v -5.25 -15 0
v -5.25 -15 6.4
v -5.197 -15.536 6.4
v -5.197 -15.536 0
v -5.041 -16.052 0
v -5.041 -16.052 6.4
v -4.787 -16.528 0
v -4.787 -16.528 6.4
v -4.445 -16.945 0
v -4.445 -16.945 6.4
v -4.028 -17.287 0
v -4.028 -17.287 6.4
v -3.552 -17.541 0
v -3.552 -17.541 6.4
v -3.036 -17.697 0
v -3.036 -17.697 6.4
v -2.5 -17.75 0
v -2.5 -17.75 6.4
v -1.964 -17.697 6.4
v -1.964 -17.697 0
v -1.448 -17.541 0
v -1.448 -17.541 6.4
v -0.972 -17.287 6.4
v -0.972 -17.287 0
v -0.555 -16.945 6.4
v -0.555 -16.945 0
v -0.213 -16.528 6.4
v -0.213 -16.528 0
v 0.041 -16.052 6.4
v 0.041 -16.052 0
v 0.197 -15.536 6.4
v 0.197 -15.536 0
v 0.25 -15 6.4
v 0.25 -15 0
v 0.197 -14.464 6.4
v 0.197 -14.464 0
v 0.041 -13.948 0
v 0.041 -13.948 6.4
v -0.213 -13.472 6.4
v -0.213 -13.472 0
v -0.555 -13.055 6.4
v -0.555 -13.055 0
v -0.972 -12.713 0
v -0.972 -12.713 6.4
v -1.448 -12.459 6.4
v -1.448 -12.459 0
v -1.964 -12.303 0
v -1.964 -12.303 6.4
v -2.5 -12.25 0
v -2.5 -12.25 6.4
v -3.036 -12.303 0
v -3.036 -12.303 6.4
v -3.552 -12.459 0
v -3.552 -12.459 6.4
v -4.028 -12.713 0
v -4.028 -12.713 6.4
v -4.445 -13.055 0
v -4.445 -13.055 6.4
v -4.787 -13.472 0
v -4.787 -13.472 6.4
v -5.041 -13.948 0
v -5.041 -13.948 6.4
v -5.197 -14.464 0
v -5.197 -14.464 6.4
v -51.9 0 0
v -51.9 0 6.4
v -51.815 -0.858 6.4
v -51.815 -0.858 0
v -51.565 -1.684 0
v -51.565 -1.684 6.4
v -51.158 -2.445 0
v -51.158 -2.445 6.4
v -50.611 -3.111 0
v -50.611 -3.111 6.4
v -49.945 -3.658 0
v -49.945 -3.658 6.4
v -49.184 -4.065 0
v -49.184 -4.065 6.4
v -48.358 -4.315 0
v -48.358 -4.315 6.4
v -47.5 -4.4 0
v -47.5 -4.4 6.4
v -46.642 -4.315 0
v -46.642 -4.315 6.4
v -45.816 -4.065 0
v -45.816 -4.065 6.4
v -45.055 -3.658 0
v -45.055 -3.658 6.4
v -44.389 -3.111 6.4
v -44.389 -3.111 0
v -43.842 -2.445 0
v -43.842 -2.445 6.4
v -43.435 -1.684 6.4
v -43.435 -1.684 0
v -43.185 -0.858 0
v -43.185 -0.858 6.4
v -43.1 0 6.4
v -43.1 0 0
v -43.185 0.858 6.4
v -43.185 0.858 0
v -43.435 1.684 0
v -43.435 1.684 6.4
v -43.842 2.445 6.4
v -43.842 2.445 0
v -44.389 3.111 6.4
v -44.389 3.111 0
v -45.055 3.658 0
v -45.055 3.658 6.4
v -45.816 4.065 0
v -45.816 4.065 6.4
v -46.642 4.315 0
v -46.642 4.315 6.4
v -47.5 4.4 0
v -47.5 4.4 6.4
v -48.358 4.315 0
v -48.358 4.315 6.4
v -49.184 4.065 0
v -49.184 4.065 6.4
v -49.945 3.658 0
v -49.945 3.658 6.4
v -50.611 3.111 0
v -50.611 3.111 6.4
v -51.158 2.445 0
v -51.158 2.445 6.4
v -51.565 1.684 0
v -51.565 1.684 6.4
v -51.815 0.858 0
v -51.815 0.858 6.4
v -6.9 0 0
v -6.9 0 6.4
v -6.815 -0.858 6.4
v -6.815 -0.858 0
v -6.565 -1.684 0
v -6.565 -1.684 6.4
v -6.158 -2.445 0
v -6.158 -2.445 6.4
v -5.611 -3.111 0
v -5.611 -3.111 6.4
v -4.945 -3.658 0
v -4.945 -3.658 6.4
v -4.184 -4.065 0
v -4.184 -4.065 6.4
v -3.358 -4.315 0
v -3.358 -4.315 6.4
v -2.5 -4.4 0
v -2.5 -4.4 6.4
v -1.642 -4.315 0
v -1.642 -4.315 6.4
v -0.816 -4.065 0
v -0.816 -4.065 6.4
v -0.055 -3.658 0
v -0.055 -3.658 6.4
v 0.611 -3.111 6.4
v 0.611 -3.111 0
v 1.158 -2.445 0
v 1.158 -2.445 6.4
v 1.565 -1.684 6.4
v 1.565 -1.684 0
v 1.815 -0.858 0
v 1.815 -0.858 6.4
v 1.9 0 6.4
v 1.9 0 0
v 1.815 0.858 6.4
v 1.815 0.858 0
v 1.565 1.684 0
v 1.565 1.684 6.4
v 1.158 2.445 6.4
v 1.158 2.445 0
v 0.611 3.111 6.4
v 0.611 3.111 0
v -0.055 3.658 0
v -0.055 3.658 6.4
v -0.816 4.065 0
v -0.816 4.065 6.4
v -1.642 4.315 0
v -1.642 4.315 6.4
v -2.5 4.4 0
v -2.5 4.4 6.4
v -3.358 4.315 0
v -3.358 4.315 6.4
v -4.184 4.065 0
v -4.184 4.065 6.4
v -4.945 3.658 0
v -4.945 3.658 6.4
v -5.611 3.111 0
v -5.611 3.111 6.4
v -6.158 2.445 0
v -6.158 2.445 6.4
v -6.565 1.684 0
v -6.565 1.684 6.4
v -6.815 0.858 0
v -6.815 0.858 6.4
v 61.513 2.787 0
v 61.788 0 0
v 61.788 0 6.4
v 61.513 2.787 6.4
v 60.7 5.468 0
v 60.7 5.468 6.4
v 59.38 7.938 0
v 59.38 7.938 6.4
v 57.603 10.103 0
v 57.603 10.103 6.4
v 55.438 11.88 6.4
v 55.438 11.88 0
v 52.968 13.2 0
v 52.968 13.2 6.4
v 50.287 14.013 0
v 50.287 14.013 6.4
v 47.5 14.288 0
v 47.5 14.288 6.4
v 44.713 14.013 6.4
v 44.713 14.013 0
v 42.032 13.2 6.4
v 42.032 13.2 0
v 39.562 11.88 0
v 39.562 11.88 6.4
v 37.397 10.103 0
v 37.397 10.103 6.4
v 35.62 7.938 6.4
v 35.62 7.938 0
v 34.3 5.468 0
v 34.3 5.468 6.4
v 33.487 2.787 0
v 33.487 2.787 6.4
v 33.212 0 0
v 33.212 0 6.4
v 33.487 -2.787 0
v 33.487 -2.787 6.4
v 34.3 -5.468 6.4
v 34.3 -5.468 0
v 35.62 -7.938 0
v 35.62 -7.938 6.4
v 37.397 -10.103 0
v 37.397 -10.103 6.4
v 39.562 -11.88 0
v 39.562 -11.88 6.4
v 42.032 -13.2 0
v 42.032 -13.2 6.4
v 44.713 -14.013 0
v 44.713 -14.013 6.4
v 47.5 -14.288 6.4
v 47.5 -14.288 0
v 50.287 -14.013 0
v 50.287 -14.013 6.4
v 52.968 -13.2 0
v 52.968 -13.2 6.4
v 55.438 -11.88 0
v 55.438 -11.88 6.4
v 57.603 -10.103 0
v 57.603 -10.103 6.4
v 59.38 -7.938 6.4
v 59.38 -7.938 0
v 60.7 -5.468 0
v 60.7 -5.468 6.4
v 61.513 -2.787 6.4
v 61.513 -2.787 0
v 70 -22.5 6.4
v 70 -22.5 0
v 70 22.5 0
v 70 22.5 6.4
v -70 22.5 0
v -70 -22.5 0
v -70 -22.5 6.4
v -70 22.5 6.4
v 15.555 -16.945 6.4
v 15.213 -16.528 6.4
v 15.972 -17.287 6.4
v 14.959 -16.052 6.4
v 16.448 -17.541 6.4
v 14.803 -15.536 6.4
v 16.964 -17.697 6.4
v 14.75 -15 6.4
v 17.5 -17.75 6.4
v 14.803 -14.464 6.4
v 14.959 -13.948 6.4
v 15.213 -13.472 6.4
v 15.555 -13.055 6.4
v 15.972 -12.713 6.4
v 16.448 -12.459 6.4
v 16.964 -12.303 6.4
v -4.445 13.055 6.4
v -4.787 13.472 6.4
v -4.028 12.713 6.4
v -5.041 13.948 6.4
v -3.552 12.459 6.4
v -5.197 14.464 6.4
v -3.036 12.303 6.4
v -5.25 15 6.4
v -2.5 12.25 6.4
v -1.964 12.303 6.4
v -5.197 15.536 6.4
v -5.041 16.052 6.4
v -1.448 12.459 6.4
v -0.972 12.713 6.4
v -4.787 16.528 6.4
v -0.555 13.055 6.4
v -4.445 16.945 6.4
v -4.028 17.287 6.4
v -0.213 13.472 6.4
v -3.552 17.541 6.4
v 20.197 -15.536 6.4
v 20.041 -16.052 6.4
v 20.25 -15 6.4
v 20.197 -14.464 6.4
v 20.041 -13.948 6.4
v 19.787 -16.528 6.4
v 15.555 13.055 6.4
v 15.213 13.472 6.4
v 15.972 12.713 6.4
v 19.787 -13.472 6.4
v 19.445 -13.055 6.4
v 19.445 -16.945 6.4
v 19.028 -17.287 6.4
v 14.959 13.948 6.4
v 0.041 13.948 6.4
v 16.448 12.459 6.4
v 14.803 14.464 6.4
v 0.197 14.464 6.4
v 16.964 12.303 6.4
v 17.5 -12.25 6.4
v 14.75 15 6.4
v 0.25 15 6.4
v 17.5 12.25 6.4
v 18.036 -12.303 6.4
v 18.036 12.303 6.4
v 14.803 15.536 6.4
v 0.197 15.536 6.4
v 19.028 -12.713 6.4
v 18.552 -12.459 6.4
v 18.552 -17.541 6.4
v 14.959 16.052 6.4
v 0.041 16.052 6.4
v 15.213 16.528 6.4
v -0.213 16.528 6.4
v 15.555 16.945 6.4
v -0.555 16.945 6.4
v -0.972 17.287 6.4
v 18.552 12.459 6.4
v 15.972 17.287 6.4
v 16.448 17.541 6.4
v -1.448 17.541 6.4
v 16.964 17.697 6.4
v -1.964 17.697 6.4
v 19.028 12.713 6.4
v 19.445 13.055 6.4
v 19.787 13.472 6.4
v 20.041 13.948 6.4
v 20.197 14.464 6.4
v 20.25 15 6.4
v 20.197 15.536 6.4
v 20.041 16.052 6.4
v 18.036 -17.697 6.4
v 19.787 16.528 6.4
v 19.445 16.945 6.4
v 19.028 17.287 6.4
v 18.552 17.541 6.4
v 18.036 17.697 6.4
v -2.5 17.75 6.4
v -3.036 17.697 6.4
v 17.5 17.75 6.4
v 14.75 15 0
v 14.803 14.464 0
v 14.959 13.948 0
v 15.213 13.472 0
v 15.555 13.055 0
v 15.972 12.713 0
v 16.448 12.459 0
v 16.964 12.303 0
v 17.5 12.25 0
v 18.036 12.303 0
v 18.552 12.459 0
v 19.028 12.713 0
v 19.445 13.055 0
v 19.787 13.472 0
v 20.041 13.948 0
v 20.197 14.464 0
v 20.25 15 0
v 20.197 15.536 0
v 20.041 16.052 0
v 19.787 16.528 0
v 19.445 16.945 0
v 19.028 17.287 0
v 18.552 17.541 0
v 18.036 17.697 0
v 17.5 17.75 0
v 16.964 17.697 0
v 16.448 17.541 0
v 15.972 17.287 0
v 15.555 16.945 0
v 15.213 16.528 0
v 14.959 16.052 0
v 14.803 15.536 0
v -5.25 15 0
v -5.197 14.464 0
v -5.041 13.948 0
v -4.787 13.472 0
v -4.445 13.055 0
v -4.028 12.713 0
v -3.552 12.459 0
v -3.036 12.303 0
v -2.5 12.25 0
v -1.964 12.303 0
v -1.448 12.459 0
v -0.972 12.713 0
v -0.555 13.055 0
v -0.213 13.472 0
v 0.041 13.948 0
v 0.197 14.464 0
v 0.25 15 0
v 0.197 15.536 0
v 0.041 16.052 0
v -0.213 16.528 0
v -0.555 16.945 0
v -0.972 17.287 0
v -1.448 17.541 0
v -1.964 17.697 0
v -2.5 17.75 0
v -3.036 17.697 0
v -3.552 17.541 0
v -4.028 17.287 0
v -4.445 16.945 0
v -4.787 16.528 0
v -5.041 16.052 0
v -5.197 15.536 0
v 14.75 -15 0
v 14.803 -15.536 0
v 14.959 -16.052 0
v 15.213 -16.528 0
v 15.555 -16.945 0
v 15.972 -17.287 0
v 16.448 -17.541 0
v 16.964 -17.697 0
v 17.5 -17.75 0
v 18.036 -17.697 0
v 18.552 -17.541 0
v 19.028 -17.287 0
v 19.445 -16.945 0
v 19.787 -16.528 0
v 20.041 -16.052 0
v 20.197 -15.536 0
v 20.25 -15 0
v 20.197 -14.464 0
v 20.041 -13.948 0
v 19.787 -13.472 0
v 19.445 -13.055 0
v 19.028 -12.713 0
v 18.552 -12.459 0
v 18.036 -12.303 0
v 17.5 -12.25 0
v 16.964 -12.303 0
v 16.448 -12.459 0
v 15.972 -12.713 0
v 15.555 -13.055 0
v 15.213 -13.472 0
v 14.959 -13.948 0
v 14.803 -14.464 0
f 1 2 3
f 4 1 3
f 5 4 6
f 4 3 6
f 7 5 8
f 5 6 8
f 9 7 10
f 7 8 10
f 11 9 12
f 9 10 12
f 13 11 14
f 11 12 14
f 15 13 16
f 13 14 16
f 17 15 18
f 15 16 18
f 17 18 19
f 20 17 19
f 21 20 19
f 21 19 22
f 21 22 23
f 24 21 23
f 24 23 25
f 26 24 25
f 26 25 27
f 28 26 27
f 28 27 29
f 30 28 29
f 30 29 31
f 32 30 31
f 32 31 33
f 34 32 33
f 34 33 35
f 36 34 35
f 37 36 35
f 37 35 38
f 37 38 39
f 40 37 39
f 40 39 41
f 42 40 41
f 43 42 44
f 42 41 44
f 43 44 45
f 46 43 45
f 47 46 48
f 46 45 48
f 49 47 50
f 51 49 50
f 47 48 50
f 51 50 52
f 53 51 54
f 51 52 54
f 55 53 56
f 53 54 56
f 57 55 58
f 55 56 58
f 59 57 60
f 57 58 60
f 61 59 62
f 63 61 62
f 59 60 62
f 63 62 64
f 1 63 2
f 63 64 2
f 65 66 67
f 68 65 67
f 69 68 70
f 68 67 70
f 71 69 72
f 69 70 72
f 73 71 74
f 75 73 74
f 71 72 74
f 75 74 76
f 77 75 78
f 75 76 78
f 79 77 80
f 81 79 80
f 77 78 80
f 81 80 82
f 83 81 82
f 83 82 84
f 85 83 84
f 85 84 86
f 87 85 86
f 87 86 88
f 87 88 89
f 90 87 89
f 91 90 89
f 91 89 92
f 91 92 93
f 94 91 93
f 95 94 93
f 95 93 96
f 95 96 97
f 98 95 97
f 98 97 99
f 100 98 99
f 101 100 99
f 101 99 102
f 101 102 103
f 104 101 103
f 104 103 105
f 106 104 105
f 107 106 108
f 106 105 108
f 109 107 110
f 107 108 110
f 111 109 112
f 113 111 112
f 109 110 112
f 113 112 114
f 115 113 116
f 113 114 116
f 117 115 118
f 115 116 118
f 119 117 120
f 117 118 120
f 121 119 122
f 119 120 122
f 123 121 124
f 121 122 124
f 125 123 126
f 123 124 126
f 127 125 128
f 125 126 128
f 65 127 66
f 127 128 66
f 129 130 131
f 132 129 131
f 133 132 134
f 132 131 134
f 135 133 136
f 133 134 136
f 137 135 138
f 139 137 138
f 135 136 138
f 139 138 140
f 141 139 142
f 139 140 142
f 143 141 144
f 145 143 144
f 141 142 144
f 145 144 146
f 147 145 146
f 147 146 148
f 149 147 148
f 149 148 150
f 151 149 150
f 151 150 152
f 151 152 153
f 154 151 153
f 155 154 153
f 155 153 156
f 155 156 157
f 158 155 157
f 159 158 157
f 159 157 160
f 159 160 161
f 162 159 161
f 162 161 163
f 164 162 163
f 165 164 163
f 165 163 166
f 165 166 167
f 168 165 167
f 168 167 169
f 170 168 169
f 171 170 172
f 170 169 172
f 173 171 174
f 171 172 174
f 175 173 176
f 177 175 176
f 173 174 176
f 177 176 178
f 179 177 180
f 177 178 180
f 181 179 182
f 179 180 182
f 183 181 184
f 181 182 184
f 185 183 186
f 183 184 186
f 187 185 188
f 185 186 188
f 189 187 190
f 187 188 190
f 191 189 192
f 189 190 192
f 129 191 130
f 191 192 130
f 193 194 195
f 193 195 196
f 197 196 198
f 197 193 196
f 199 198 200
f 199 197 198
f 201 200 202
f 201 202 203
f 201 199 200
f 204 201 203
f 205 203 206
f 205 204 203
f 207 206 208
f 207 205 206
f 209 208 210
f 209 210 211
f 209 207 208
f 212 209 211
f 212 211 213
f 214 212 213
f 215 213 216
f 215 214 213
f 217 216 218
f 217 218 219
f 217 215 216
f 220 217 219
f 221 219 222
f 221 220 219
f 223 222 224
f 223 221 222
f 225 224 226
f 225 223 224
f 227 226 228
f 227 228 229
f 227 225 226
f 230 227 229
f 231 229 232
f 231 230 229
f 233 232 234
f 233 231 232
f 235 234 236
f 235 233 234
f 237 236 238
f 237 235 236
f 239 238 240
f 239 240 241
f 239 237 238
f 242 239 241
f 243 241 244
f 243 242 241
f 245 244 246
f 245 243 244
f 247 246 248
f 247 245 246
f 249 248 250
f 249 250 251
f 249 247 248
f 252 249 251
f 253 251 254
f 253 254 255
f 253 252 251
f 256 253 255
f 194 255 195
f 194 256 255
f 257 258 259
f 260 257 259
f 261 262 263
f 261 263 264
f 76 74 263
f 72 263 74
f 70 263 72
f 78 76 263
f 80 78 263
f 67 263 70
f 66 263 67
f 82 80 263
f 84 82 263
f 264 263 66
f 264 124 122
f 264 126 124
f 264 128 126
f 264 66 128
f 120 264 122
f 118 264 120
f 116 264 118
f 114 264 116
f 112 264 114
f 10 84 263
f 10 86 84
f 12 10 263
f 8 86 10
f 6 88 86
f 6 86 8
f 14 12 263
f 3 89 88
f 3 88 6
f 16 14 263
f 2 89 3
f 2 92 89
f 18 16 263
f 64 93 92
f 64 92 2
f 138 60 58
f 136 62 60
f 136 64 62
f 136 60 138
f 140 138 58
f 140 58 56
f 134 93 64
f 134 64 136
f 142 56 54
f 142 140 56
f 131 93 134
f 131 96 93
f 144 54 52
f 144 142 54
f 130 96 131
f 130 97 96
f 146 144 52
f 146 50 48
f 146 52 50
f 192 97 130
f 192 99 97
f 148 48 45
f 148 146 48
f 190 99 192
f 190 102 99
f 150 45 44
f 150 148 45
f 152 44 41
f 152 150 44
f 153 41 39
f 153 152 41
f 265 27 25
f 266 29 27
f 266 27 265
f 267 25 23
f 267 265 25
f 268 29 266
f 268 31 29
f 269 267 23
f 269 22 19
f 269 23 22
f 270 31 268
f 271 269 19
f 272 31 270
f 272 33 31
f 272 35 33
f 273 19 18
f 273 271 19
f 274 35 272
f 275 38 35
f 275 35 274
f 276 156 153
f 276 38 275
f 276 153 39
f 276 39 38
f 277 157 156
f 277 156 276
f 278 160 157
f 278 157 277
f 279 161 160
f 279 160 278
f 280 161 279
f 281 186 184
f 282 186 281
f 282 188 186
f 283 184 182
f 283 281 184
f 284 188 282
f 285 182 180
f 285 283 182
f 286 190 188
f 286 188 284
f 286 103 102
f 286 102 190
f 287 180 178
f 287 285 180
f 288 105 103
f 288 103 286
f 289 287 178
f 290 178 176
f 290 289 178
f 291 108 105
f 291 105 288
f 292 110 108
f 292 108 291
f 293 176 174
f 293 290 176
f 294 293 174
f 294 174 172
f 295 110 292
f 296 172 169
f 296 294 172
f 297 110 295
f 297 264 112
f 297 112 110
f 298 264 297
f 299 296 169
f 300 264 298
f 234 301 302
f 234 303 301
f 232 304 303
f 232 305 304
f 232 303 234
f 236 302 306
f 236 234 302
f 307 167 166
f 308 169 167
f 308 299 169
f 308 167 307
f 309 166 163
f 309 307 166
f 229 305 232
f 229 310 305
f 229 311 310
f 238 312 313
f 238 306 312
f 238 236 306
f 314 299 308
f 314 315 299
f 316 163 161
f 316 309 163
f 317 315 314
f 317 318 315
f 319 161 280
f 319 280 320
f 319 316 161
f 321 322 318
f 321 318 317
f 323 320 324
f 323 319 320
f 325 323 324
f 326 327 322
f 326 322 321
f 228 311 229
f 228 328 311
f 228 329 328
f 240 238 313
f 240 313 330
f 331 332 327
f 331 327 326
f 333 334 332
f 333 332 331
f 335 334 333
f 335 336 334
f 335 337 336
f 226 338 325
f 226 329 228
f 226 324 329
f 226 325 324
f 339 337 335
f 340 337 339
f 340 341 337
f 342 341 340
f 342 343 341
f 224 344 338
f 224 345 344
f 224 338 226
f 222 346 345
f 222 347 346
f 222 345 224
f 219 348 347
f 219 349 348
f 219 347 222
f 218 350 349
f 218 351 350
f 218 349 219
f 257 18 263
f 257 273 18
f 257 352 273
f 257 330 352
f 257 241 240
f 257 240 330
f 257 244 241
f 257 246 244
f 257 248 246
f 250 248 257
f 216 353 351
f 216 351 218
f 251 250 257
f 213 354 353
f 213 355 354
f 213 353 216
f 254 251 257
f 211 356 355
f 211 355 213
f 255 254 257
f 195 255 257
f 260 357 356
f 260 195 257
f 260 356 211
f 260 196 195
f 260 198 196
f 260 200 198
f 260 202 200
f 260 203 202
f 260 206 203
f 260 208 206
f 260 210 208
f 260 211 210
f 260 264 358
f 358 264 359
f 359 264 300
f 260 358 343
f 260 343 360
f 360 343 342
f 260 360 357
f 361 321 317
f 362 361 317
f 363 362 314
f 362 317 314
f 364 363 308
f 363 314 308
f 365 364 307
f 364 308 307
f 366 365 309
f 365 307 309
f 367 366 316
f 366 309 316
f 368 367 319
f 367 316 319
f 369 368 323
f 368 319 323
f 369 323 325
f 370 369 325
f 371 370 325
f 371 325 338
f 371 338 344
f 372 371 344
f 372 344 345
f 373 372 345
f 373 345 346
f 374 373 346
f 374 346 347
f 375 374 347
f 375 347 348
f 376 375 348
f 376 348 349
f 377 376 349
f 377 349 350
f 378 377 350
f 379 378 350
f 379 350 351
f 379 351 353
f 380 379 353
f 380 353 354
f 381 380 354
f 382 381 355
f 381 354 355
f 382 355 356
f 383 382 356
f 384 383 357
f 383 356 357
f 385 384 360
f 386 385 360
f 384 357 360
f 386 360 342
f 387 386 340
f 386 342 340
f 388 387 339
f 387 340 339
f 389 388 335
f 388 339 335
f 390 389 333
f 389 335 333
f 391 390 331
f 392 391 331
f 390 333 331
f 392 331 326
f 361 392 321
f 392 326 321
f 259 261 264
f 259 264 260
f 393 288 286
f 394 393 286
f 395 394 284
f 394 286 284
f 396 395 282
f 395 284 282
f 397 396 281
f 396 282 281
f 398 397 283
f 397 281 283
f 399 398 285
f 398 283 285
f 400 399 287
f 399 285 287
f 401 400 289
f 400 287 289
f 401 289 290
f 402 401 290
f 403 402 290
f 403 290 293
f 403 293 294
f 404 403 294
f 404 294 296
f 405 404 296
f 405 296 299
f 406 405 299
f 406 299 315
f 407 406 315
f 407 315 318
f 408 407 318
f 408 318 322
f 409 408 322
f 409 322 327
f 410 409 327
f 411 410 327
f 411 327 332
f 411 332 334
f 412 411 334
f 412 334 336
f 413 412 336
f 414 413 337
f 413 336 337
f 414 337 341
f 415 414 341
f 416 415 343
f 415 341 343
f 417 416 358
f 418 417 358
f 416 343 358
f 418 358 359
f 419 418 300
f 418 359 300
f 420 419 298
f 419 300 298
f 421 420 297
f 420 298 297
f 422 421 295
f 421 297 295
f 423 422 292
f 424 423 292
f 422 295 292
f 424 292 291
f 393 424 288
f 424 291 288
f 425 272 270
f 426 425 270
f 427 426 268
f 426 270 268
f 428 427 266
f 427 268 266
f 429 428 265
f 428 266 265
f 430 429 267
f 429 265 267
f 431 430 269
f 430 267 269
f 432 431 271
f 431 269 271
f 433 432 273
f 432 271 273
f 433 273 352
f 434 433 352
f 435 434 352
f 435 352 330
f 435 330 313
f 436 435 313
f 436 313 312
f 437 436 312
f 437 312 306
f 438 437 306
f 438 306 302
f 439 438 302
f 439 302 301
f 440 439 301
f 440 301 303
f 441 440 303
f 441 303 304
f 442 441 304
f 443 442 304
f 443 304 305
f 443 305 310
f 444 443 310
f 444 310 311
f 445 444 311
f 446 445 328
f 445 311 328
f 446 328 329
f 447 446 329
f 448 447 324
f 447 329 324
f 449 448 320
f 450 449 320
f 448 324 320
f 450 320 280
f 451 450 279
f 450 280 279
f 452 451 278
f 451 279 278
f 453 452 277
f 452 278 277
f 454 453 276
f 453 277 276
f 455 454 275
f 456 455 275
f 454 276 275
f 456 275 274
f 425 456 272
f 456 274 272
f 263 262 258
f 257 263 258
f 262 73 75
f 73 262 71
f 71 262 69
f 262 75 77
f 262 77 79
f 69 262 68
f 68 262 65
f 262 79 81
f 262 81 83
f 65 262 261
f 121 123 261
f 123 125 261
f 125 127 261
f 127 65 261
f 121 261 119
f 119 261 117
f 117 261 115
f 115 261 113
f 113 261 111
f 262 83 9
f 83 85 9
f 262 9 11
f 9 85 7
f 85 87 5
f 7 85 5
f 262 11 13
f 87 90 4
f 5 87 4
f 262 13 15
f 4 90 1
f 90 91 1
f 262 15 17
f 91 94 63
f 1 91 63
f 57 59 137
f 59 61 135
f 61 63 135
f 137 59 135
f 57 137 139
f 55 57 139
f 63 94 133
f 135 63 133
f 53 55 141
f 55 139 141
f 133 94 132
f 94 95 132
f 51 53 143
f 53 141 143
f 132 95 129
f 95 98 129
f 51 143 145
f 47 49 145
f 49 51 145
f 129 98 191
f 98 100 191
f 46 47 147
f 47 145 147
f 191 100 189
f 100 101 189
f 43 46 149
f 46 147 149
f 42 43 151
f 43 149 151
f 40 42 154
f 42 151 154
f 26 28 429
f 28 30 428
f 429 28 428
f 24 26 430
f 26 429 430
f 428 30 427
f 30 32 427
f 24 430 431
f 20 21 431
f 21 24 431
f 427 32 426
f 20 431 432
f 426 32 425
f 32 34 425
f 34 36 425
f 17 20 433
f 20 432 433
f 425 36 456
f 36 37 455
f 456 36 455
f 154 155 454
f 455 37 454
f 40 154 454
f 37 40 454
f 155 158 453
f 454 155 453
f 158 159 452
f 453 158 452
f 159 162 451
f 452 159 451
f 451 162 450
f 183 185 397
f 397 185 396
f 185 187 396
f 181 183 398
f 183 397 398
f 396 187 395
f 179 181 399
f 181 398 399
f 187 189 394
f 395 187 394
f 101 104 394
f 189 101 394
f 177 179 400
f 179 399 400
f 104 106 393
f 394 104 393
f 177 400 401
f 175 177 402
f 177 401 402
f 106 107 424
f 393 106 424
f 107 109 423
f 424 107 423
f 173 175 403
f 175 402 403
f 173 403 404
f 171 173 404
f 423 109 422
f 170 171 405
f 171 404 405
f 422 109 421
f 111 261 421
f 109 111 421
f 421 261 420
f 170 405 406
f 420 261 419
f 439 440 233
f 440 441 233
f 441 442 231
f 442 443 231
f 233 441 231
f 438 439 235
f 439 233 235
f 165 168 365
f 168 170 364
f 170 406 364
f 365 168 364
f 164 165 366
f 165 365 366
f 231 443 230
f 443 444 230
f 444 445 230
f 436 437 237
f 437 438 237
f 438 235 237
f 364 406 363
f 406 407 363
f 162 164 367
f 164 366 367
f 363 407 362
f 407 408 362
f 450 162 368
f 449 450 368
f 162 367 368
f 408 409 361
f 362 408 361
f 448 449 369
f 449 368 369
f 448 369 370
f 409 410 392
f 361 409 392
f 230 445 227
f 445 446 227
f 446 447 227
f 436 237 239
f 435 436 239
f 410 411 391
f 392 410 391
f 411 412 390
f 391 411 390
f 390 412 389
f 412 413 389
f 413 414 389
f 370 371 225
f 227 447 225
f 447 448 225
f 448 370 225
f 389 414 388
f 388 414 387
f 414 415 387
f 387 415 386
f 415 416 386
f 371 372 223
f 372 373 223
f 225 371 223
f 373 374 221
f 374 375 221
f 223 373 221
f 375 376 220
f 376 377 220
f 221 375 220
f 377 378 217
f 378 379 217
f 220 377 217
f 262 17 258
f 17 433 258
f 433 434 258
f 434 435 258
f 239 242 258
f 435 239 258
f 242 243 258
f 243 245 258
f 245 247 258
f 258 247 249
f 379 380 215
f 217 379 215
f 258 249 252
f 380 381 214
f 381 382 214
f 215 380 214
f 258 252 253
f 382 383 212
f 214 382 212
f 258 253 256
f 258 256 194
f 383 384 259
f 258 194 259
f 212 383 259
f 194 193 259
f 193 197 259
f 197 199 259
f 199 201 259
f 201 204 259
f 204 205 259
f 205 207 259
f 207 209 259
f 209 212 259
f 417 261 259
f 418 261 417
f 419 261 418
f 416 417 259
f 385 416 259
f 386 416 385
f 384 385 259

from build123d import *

# Parameters (mm, degrees)
F0_W     = 140
F0_H     = 45
F0_R     = 14.2875
F1_DEPTH = 6.4
F3_D     = 8.8
F5_D     = 5.5
F5_DEPTH = 13.5
F5_TIP   = 1.6523667023


with BuildPart() as f1:
    # F0 (on Top) → F1 (new body)
    with BuildSketch(Plane.XY):
        Rectangle(F0_W, F0_H)
        with Locations((47.5, 0)):
            Circle(F0_R, mode=Mode.SUBTRACT)
    extrude(amount=F1_DEPTH)

    # F3 (through all)
    with Locations(Plane(origin=(0, 0, 0), x_dir=(1, 0, 0), z_dir=(0, 0, -1))):
        with Locations((-47.5, 0), (-2.5, 0)):
            Hole(F3_D / 2)

    # F5
    with Locations(Plane(origin=(0, 0, 0), x_dir=(1, 0, 0), z_dir=(0, 0, -1))):
        with Locations((-2.5, -15), (17.5, -15), (17.5, 15), (-2.5, 15)):
            Hole(F5_D / 2, depth=F5_DEPTH)
            with Locations((0, 0, -(F5_DEPTH + F5_TIP / 2))):  # 118° drill point
                Cone(0, F5_D / 2, F5_TIP, mode=Mode.SUBTRACT)


solid = f1.part
